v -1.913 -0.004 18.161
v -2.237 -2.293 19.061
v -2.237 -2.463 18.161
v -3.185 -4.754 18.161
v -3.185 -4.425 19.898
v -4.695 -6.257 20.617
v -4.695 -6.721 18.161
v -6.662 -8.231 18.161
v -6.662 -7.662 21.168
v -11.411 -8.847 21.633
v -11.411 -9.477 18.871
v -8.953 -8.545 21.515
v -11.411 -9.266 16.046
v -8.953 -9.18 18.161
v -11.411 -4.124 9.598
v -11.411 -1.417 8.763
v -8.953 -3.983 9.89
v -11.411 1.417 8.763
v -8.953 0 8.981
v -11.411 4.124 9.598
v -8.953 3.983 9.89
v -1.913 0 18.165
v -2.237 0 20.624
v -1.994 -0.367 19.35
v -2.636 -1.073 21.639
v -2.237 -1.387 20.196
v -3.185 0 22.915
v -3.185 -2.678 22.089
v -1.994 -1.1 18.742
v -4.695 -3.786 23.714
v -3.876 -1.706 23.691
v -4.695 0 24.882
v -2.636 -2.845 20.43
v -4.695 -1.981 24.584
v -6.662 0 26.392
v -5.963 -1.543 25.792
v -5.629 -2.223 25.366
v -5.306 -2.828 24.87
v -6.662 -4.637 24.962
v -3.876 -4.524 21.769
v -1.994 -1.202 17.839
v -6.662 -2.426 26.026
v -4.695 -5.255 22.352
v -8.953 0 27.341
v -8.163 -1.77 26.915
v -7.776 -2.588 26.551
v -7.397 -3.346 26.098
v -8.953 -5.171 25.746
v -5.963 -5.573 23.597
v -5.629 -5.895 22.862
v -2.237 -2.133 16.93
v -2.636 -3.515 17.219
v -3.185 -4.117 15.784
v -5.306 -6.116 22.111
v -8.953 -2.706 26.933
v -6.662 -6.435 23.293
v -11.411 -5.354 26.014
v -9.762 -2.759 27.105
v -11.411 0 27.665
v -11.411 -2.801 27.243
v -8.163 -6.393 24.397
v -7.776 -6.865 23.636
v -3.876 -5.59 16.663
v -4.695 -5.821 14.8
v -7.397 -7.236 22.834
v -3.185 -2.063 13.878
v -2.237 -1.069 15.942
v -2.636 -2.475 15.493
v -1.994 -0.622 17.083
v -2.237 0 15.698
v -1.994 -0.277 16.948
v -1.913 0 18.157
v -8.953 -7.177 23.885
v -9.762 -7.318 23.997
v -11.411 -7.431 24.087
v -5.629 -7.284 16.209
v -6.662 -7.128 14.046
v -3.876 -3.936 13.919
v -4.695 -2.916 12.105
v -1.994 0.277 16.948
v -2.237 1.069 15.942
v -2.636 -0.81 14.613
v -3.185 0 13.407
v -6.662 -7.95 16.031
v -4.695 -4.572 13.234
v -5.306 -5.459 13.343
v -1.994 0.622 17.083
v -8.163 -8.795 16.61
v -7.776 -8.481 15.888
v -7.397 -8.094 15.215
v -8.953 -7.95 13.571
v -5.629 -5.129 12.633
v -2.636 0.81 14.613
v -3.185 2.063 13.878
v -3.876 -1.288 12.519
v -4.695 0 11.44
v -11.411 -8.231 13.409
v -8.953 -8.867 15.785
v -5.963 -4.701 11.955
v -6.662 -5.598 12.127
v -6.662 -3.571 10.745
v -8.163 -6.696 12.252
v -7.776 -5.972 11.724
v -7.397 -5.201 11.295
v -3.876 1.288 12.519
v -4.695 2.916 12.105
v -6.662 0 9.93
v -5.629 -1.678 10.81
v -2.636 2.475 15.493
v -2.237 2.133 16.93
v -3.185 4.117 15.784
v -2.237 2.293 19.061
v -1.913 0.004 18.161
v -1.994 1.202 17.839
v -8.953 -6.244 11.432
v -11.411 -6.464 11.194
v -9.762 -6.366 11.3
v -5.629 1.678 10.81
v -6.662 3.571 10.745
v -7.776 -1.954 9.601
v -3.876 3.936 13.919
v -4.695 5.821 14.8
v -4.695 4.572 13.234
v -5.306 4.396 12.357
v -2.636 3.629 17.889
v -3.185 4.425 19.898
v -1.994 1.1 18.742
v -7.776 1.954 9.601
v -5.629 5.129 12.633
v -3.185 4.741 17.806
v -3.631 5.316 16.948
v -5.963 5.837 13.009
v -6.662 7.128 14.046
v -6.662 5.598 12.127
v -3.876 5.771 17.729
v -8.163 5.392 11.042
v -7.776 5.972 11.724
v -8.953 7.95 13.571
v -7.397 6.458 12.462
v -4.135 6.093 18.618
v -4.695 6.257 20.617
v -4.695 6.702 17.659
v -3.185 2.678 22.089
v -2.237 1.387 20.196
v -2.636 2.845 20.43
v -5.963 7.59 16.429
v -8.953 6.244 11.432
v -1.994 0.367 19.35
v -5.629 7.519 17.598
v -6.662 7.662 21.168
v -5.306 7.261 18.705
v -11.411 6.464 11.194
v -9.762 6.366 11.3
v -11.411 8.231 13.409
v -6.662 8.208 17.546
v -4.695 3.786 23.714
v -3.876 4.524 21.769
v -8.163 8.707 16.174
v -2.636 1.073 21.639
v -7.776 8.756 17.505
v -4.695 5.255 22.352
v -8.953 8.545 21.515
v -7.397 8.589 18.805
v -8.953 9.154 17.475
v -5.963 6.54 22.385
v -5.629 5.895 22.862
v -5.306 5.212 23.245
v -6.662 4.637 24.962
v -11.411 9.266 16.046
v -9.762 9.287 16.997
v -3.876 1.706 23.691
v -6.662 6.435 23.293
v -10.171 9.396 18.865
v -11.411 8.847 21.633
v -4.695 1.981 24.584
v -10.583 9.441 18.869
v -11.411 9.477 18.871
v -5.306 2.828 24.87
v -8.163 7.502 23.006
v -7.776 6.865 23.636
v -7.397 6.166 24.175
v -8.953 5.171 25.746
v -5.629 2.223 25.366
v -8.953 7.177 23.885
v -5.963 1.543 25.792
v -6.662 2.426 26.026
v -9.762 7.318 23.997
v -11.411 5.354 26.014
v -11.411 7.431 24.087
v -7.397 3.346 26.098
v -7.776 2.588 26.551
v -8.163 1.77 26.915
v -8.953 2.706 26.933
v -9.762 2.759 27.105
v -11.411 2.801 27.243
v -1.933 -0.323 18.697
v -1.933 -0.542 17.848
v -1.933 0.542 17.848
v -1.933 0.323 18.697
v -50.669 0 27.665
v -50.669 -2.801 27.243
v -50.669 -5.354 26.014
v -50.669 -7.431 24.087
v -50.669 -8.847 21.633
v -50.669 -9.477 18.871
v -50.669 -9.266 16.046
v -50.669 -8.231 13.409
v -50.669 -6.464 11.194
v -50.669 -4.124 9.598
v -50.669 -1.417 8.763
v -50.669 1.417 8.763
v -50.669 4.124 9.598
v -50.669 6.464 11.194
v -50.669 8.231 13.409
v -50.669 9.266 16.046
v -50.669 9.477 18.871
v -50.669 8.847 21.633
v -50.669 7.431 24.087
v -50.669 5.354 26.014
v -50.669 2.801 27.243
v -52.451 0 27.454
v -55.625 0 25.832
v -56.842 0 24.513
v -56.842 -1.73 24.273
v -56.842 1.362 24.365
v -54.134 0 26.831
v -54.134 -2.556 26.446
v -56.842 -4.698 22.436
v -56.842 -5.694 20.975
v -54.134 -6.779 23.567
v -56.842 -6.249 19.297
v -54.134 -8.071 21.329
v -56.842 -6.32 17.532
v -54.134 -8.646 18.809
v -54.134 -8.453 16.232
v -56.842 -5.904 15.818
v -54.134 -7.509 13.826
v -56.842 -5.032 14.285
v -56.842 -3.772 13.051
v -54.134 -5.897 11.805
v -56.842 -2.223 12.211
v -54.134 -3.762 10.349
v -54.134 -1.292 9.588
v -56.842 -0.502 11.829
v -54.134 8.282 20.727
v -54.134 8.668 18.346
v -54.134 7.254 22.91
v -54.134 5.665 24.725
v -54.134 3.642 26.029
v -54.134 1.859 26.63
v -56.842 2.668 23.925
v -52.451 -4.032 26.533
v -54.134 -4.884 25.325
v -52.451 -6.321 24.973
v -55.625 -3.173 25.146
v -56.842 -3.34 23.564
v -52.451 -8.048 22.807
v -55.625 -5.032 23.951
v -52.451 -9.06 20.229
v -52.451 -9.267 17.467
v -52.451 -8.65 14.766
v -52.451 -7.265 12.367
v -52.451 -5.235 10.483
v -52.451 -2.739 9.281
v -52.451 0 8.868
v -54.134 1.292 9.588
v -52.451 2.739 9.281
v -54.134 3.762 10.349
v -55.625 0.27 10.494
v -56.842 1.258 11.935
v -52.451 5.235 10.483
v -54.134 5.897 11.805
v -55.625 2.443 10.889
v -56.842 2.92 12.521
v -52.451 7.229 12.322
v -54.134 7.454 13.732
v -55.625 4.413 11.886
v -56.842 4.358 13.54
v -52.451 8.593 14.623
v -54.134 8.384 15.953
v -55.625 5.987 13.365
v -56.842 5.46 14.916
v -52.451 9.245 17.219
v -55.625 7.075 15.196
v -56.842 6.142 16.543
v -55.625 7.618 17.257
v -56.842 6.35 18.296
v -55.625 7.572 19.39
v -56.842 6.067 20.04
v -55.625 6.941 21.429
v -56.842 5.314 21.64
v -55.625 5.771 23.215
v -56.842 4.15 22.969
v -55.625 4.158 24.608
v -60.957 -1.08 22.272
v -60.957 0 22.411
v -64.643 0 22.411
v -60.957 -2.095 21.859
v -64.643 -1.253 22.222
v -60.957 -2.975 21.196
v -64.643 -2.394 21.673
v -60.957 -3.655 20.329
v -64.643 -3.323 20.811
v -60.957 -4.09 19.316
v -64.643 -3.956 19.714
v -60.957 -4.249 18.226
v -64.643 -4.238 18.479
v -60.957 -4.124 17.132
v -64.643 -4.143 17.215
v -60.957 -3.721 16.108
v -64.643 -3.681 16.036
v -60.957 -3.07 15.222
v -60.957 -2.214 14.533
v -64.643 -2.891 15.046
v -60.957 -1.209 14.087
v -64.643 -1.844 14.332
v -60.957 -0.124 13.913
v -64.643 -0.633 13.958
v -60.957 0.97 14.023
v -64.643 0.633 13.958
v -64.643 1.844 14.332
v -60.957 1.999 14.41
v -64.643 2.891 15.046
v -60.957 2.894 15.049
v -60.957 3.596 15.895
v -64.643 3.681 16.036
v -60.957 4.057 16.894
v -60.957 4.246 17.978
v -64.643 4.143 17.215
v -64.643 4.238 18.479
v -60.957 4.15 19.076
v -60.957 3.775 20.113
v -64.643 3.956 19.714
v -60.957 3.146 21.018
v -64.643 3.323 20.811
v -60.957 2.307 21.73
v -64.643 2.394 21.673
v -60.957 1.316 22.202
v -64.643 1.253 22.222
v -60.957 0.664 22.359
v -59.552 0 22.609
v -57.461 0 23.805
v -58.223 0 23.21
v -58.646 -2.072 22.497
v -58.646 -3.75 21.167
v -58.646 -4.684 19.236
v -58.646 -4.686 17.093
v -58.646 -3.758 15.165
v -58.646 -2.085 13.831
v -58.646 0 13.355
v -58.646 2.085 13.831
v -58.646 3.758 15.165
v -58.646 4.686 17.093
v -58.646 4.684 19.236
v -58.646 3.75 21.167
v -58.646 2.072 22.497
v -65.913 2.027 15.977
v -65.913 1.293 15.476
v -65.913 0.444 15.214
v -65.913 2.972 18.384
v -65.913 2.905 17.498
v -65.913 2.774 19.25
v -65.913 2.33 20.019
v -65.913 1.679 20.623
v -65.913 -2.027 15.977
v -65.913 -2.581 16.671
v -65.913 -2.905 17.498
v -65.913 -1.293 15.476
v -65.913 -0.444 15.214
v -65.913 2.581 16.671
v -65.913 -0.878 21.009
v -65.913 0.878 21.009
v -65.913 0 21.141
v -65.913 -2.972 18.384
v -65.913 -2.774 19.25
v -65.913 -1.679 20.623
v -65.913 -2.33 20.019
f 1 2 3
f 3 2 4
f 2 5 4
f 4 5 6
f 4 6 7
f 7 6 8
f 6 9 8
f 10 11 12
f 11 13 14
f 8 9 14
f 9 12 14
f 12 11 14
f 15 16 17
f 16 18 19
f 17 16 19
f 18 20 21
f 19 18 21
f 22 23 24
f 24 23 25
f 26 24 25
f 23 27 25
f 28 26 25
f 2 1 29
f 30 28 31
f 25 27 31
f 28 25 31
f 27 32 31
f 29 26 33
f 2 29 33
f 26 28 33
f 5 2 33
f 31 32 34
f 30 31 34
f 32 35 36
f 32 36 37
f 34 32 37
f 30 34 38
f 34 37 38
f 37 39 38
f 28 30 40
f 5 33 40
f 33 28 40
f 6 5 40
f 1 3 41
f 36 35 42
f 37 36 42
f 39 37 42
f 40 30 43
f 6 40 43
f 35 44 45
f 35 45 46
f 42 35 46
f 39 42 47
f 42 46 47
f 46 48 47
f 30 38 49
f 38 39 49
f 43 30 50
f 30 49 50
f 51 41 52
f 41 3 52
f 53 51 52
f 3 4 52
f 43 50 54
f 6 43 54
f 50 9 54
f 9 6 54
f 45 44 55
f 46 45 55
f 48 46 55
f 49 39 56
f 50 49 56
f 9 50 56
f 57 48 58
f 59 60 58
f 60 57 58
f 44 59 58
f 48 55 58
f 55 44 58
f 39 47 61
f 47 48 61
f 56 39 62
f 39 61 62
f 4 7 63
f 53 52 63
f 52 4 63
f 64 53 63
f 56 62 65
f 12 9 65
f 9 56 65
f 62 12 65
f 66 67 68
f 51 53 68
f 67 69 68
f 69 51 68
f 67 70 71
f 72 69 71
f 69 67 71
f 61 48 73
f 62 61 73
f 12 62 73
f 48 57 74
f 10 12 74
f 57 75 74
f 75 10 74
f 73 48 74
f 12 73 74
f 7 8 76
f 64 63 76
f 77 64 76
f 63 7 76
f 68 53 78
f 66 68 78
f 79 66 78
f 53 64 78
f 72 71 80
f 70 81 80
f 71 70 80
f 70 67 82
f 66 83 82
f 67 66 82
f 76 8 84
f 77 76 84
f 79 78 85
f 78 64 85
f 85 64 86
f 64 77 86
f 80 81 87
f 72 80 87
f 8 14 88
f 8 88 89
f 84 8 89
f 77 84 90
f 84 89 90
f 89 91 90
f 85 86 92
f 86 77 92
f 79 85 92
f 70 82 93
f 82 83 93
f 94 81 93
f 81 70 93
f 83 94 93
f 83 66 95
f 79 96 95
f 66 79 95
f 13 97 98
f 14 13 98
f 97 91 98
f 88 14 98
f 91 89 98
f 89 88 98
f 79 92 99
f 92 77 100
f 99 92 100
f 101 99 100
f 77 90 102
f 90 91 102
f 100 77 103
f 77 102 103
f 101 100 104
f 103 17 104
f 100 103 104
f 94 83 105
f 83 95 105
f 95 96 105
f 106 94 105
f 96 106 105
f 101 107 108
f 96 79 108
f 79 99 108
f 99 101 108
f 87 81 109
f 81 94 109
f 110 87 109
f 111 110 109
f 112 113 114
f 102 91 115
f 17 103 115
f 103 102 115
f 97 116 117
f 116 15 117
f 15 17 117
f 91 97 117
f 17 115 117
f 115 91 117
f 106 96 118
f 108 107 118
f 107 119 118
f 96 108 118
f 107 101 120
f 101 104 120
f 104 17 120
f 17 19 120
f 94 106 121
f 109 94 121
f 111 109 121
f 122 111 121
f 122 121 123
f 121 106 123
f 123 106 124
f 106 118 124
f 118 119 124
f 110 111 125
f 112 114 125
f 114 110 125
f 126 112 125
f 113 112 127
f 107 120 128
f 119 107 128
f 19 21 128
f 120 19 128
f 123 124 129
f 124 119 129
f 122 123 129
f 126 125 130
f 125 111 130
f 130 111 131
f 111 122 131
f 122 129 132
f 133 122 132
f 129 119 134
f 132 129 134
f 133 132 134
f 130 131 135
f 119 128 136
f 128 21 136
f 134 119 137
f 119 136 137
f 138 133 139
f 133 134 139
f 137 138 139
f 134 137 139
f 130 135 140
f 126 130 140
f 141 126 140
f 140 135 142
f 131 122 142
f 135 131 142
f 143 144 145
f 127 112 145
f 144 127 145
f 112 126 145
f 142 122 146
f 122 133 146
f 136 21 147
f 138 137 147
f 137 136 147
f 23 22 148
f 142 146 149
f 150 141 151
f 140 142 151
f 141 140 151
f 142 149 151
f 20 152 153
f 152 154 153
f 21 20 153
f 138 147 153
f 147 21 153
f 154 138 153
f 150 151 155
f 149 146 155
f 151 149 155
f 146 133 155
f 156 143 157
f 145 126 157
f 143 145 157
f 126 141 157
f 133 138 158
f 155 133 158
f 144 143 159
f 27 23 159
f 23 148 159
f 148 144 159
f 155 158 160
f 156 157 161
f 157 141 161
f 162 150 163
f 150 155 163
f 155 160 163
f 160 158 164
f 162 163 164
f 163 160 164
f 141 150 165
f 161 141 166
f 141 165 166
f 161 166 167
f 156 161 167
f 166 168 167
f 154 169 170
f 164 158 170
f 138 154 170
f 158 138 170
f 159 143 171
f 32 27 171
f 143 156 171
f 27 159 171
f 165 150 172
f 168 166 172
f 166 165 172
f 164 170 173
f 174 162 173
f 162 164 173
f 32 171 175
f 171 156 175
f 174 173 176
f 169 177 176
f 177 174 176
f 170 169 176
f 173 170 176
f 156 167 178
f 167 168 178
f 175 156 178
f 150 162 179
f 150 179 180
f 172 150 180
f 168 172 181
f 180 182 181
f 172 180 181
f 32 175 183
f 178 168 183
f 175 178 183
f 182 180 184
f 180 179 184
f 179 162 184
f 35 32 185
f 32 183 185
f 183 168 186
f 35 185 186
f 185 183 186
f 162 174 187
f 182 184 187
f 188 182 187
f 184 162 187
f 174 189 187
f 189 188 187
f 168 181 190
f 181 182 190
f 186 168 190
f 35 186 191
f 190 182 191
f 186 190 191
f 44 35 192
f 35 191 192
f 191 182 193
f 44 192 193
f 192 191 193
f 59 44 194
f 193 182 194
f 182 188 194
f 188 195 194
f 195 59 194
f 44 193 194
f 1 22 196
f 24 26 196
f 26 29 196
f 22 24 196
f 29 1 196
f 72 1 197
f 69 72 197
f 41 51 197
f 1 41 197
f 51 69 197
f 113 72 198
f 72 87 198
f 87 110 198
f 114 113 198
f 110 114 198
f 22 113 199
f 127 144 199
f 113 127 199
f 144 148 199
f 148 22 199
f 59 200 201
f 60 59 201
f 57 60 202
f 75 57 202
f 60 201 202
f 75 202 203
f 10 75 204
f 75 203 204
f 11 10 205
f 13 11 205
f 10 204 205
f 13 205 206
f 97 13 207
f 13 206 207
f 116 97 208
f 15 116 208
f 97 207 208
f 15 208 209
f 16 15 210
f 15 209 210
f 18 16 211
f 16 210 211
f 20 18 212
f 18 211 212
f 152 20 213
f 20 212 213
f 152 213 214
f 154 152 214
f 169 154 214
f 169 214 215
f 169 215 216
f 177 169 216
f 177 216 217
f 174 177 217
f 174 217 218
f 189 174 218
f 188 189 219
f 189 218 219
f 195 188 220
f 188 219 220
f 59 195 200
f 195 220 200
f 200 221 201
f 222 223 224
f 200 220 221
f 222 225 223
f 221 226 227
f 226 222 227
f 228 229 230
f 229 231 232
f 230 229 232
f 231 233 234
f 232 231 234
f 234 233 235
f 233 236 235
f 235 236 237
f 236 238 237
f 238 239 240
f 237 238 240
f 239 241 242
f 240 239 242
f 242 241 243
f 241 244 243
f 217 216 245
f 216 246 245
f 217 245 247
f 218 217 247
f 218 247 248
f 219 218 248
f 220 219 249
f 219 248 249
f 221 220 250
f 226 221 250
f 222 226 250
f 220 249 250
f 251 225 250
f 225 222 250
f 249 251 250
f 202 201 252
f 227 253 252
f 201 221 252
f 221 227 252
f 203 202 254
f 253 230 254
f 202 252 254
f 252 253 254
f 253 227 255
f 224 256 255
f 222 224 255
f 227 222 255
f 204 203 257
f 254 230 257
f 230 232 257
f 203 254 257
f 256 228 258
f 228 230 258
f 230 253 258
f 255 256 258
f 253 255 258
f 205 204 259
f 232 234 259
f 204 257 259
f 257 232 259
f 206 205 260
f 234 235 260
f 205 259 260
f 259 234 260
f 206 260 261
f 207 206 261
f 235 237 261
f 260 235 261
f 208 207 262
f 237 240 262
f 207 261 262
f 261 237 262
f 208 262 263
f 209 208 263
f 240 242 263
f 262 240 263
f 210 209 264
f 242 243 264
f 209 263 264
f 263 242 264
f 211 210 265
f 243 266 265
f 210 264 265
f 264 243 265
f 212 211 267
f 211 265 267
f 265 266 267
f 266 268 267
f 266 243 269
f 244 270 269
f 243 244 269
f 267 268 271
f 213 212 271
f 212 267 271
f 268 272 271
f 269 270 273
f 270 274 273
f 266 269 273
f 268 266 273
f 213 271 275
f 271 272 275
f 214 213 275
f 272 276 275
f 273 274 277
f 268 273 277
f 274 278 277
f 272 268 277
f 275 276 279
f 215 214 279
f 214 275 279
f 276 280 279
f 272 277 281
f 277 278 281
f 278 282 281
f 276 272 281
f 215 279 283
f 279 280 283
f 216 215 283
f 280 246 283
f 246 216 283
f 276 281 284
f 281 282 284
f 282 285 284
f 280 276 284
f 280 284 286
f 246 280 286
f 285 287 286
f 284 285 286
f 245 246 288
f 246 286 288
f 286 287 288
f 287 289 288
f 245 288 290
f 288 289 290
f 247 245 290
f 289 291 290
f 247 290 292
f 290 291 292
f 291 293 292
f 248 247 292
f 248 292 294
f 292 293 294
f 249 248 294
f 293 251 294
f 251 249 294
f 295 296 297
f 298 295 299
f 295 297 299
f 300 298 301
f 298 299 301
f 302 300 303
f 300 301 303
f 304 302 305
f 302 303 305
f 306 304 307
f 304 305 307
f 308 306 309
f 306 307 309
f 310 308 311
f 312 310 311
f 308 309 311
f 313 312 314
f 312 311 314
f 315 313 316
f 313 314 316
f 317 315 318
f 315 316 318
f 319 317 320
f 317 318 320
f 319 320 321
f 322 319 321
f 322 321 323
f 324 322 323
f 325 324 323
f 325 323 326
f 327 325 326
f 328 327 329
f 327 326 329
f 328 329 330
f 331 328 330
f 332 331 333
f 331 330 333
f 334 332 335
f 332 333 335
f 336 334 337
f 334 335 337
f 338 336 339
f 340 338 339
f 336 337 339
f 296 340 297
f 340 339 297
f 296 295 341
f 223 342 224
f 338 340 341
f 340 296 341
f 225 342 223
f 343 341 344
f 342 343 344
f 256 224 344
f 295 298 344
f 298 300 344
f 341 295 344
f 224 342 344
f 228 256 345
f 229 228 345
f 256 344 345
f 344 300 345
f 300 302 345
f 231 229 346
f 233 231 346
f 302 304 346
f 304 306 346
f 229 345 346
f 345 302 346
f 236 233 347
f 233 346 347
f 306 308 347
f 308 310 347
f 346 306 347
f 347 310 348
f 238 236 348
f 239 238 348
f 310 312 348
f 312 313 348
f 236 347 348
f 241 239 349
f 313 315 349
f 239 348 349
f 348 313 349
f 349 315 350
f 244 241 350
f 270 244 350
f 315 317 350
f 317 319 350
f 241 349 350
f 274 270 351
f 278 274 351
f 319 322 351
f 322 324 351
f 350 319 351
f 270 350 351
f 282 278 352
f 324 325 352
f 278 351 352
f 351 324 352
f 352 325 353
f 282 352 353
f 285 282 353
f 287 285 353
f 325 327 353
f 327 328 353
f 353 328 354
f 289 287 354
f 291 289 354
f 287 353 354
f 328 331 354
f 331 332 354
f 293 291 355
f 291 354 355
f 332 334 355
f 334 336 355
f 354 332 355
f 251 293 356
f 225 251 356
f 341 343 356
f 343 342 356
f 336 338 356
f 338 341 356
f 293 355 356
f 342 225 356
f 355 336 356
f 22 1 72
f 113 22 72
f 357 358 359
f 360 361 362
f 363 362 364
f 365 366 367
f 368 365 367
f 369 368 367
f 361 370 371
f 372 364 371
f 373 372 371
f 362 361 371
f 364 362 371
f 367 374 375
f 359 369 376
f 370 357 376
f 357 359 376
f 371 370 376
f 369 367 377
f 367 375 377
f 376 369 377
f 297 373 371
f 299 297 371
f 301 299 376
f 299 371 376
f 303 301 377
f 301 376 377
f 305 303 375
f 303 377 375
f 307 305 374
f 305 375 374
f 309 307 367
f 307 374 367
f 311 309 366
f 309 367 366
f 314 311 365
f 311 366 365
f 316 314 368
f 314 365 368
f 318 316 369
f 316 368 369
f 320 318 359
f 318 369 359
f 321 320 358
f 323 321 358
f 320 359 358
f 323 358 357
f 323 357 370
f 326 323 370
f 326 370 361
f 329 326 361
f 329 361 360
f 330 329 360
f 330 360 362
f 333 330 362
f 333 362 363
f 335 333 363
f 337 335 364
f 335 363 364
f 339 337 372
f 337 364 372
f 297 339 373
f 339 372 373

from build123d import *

# Parameters (mm, degrees)
F3_R    = 5.08
F4_SIZE = 1.27


# Not quite as in the source:
# - a fillet or chamfer that OpenCascade refuses, or shapes differently, is made with other operations: its cross-section is extruded or revolved along the edge and cut away or added


with BuildPart() as f1:
    # F0 (on Front) → F1 (revolve)
    with BuildSketch(Plane.XZ):
        with BuildLine():
            Line((-65.912999015, 22.4110006839), (-65.912999015, 18.1610006839))
            Line((-65.912999015, 18.1610006839), (-1.912999015, 18.1610006839))
            Line((-1.912999015, 18.1610006839), (-1.912999015, 18.1654242131))
            ThreePointArc((-1.912999015, 18.1654242131), (-4.6948756483, 24.8821639675), (-11.4112079773, 27.6650241112))
            Line((-11.4112079773, 27.6650241112), (-57.911999015, 27.6650241112))
            Line((-57.911999015, 27.6650241112), (-57.911999015, 22.4110006839))
            Line((-57.911999015, 22.4110006839), (-65.912999015, 22.4110006839))
        make_face()
    revolve(axis=Axis((-33.912999015, 0, 18.1610006839), (1, 0, 0)))

    # F2: fillet of radius 7.62 on 1 edges, made by hand

    # F2_s1 → F2_t2 (revolve, cut)
    with BuildSketch(Plane.XZ):
        with BuildLine():
            ThreePointArc((-50.6686189437, 27.6650241112), (-55.1427478263, 26.2132143435), (-57.911999015, 22.4110006839))
            Line((-57.911999015, 22.4110006839), (-57.911999015, 27.6650241112))
            Line((-57.911999015, 27.6650241112), (-50.6686189437, 27.6650241112))
        make_face()
    revolve(axis=Axis((-57.911999015, 0, 18.1610006839), (1, 0, 0)), mode=Mode.SUBTRACT)

    # F3
    f3_edges = [f1.edges().sort_by_distance(p)[0] for p in [
        (-57.911999, 0, 13.911001),
    ]]
    fillet(f3_edges, radius=F3_R)

    # F4
    f4_edges = [f1.edges().sort_by_distance(p)[0] for p in [
        (-65.912999, 0, 13.911001),
    ]]
    chamfer(f4_edges, length=F4_SIZE)


solid = f1.part
